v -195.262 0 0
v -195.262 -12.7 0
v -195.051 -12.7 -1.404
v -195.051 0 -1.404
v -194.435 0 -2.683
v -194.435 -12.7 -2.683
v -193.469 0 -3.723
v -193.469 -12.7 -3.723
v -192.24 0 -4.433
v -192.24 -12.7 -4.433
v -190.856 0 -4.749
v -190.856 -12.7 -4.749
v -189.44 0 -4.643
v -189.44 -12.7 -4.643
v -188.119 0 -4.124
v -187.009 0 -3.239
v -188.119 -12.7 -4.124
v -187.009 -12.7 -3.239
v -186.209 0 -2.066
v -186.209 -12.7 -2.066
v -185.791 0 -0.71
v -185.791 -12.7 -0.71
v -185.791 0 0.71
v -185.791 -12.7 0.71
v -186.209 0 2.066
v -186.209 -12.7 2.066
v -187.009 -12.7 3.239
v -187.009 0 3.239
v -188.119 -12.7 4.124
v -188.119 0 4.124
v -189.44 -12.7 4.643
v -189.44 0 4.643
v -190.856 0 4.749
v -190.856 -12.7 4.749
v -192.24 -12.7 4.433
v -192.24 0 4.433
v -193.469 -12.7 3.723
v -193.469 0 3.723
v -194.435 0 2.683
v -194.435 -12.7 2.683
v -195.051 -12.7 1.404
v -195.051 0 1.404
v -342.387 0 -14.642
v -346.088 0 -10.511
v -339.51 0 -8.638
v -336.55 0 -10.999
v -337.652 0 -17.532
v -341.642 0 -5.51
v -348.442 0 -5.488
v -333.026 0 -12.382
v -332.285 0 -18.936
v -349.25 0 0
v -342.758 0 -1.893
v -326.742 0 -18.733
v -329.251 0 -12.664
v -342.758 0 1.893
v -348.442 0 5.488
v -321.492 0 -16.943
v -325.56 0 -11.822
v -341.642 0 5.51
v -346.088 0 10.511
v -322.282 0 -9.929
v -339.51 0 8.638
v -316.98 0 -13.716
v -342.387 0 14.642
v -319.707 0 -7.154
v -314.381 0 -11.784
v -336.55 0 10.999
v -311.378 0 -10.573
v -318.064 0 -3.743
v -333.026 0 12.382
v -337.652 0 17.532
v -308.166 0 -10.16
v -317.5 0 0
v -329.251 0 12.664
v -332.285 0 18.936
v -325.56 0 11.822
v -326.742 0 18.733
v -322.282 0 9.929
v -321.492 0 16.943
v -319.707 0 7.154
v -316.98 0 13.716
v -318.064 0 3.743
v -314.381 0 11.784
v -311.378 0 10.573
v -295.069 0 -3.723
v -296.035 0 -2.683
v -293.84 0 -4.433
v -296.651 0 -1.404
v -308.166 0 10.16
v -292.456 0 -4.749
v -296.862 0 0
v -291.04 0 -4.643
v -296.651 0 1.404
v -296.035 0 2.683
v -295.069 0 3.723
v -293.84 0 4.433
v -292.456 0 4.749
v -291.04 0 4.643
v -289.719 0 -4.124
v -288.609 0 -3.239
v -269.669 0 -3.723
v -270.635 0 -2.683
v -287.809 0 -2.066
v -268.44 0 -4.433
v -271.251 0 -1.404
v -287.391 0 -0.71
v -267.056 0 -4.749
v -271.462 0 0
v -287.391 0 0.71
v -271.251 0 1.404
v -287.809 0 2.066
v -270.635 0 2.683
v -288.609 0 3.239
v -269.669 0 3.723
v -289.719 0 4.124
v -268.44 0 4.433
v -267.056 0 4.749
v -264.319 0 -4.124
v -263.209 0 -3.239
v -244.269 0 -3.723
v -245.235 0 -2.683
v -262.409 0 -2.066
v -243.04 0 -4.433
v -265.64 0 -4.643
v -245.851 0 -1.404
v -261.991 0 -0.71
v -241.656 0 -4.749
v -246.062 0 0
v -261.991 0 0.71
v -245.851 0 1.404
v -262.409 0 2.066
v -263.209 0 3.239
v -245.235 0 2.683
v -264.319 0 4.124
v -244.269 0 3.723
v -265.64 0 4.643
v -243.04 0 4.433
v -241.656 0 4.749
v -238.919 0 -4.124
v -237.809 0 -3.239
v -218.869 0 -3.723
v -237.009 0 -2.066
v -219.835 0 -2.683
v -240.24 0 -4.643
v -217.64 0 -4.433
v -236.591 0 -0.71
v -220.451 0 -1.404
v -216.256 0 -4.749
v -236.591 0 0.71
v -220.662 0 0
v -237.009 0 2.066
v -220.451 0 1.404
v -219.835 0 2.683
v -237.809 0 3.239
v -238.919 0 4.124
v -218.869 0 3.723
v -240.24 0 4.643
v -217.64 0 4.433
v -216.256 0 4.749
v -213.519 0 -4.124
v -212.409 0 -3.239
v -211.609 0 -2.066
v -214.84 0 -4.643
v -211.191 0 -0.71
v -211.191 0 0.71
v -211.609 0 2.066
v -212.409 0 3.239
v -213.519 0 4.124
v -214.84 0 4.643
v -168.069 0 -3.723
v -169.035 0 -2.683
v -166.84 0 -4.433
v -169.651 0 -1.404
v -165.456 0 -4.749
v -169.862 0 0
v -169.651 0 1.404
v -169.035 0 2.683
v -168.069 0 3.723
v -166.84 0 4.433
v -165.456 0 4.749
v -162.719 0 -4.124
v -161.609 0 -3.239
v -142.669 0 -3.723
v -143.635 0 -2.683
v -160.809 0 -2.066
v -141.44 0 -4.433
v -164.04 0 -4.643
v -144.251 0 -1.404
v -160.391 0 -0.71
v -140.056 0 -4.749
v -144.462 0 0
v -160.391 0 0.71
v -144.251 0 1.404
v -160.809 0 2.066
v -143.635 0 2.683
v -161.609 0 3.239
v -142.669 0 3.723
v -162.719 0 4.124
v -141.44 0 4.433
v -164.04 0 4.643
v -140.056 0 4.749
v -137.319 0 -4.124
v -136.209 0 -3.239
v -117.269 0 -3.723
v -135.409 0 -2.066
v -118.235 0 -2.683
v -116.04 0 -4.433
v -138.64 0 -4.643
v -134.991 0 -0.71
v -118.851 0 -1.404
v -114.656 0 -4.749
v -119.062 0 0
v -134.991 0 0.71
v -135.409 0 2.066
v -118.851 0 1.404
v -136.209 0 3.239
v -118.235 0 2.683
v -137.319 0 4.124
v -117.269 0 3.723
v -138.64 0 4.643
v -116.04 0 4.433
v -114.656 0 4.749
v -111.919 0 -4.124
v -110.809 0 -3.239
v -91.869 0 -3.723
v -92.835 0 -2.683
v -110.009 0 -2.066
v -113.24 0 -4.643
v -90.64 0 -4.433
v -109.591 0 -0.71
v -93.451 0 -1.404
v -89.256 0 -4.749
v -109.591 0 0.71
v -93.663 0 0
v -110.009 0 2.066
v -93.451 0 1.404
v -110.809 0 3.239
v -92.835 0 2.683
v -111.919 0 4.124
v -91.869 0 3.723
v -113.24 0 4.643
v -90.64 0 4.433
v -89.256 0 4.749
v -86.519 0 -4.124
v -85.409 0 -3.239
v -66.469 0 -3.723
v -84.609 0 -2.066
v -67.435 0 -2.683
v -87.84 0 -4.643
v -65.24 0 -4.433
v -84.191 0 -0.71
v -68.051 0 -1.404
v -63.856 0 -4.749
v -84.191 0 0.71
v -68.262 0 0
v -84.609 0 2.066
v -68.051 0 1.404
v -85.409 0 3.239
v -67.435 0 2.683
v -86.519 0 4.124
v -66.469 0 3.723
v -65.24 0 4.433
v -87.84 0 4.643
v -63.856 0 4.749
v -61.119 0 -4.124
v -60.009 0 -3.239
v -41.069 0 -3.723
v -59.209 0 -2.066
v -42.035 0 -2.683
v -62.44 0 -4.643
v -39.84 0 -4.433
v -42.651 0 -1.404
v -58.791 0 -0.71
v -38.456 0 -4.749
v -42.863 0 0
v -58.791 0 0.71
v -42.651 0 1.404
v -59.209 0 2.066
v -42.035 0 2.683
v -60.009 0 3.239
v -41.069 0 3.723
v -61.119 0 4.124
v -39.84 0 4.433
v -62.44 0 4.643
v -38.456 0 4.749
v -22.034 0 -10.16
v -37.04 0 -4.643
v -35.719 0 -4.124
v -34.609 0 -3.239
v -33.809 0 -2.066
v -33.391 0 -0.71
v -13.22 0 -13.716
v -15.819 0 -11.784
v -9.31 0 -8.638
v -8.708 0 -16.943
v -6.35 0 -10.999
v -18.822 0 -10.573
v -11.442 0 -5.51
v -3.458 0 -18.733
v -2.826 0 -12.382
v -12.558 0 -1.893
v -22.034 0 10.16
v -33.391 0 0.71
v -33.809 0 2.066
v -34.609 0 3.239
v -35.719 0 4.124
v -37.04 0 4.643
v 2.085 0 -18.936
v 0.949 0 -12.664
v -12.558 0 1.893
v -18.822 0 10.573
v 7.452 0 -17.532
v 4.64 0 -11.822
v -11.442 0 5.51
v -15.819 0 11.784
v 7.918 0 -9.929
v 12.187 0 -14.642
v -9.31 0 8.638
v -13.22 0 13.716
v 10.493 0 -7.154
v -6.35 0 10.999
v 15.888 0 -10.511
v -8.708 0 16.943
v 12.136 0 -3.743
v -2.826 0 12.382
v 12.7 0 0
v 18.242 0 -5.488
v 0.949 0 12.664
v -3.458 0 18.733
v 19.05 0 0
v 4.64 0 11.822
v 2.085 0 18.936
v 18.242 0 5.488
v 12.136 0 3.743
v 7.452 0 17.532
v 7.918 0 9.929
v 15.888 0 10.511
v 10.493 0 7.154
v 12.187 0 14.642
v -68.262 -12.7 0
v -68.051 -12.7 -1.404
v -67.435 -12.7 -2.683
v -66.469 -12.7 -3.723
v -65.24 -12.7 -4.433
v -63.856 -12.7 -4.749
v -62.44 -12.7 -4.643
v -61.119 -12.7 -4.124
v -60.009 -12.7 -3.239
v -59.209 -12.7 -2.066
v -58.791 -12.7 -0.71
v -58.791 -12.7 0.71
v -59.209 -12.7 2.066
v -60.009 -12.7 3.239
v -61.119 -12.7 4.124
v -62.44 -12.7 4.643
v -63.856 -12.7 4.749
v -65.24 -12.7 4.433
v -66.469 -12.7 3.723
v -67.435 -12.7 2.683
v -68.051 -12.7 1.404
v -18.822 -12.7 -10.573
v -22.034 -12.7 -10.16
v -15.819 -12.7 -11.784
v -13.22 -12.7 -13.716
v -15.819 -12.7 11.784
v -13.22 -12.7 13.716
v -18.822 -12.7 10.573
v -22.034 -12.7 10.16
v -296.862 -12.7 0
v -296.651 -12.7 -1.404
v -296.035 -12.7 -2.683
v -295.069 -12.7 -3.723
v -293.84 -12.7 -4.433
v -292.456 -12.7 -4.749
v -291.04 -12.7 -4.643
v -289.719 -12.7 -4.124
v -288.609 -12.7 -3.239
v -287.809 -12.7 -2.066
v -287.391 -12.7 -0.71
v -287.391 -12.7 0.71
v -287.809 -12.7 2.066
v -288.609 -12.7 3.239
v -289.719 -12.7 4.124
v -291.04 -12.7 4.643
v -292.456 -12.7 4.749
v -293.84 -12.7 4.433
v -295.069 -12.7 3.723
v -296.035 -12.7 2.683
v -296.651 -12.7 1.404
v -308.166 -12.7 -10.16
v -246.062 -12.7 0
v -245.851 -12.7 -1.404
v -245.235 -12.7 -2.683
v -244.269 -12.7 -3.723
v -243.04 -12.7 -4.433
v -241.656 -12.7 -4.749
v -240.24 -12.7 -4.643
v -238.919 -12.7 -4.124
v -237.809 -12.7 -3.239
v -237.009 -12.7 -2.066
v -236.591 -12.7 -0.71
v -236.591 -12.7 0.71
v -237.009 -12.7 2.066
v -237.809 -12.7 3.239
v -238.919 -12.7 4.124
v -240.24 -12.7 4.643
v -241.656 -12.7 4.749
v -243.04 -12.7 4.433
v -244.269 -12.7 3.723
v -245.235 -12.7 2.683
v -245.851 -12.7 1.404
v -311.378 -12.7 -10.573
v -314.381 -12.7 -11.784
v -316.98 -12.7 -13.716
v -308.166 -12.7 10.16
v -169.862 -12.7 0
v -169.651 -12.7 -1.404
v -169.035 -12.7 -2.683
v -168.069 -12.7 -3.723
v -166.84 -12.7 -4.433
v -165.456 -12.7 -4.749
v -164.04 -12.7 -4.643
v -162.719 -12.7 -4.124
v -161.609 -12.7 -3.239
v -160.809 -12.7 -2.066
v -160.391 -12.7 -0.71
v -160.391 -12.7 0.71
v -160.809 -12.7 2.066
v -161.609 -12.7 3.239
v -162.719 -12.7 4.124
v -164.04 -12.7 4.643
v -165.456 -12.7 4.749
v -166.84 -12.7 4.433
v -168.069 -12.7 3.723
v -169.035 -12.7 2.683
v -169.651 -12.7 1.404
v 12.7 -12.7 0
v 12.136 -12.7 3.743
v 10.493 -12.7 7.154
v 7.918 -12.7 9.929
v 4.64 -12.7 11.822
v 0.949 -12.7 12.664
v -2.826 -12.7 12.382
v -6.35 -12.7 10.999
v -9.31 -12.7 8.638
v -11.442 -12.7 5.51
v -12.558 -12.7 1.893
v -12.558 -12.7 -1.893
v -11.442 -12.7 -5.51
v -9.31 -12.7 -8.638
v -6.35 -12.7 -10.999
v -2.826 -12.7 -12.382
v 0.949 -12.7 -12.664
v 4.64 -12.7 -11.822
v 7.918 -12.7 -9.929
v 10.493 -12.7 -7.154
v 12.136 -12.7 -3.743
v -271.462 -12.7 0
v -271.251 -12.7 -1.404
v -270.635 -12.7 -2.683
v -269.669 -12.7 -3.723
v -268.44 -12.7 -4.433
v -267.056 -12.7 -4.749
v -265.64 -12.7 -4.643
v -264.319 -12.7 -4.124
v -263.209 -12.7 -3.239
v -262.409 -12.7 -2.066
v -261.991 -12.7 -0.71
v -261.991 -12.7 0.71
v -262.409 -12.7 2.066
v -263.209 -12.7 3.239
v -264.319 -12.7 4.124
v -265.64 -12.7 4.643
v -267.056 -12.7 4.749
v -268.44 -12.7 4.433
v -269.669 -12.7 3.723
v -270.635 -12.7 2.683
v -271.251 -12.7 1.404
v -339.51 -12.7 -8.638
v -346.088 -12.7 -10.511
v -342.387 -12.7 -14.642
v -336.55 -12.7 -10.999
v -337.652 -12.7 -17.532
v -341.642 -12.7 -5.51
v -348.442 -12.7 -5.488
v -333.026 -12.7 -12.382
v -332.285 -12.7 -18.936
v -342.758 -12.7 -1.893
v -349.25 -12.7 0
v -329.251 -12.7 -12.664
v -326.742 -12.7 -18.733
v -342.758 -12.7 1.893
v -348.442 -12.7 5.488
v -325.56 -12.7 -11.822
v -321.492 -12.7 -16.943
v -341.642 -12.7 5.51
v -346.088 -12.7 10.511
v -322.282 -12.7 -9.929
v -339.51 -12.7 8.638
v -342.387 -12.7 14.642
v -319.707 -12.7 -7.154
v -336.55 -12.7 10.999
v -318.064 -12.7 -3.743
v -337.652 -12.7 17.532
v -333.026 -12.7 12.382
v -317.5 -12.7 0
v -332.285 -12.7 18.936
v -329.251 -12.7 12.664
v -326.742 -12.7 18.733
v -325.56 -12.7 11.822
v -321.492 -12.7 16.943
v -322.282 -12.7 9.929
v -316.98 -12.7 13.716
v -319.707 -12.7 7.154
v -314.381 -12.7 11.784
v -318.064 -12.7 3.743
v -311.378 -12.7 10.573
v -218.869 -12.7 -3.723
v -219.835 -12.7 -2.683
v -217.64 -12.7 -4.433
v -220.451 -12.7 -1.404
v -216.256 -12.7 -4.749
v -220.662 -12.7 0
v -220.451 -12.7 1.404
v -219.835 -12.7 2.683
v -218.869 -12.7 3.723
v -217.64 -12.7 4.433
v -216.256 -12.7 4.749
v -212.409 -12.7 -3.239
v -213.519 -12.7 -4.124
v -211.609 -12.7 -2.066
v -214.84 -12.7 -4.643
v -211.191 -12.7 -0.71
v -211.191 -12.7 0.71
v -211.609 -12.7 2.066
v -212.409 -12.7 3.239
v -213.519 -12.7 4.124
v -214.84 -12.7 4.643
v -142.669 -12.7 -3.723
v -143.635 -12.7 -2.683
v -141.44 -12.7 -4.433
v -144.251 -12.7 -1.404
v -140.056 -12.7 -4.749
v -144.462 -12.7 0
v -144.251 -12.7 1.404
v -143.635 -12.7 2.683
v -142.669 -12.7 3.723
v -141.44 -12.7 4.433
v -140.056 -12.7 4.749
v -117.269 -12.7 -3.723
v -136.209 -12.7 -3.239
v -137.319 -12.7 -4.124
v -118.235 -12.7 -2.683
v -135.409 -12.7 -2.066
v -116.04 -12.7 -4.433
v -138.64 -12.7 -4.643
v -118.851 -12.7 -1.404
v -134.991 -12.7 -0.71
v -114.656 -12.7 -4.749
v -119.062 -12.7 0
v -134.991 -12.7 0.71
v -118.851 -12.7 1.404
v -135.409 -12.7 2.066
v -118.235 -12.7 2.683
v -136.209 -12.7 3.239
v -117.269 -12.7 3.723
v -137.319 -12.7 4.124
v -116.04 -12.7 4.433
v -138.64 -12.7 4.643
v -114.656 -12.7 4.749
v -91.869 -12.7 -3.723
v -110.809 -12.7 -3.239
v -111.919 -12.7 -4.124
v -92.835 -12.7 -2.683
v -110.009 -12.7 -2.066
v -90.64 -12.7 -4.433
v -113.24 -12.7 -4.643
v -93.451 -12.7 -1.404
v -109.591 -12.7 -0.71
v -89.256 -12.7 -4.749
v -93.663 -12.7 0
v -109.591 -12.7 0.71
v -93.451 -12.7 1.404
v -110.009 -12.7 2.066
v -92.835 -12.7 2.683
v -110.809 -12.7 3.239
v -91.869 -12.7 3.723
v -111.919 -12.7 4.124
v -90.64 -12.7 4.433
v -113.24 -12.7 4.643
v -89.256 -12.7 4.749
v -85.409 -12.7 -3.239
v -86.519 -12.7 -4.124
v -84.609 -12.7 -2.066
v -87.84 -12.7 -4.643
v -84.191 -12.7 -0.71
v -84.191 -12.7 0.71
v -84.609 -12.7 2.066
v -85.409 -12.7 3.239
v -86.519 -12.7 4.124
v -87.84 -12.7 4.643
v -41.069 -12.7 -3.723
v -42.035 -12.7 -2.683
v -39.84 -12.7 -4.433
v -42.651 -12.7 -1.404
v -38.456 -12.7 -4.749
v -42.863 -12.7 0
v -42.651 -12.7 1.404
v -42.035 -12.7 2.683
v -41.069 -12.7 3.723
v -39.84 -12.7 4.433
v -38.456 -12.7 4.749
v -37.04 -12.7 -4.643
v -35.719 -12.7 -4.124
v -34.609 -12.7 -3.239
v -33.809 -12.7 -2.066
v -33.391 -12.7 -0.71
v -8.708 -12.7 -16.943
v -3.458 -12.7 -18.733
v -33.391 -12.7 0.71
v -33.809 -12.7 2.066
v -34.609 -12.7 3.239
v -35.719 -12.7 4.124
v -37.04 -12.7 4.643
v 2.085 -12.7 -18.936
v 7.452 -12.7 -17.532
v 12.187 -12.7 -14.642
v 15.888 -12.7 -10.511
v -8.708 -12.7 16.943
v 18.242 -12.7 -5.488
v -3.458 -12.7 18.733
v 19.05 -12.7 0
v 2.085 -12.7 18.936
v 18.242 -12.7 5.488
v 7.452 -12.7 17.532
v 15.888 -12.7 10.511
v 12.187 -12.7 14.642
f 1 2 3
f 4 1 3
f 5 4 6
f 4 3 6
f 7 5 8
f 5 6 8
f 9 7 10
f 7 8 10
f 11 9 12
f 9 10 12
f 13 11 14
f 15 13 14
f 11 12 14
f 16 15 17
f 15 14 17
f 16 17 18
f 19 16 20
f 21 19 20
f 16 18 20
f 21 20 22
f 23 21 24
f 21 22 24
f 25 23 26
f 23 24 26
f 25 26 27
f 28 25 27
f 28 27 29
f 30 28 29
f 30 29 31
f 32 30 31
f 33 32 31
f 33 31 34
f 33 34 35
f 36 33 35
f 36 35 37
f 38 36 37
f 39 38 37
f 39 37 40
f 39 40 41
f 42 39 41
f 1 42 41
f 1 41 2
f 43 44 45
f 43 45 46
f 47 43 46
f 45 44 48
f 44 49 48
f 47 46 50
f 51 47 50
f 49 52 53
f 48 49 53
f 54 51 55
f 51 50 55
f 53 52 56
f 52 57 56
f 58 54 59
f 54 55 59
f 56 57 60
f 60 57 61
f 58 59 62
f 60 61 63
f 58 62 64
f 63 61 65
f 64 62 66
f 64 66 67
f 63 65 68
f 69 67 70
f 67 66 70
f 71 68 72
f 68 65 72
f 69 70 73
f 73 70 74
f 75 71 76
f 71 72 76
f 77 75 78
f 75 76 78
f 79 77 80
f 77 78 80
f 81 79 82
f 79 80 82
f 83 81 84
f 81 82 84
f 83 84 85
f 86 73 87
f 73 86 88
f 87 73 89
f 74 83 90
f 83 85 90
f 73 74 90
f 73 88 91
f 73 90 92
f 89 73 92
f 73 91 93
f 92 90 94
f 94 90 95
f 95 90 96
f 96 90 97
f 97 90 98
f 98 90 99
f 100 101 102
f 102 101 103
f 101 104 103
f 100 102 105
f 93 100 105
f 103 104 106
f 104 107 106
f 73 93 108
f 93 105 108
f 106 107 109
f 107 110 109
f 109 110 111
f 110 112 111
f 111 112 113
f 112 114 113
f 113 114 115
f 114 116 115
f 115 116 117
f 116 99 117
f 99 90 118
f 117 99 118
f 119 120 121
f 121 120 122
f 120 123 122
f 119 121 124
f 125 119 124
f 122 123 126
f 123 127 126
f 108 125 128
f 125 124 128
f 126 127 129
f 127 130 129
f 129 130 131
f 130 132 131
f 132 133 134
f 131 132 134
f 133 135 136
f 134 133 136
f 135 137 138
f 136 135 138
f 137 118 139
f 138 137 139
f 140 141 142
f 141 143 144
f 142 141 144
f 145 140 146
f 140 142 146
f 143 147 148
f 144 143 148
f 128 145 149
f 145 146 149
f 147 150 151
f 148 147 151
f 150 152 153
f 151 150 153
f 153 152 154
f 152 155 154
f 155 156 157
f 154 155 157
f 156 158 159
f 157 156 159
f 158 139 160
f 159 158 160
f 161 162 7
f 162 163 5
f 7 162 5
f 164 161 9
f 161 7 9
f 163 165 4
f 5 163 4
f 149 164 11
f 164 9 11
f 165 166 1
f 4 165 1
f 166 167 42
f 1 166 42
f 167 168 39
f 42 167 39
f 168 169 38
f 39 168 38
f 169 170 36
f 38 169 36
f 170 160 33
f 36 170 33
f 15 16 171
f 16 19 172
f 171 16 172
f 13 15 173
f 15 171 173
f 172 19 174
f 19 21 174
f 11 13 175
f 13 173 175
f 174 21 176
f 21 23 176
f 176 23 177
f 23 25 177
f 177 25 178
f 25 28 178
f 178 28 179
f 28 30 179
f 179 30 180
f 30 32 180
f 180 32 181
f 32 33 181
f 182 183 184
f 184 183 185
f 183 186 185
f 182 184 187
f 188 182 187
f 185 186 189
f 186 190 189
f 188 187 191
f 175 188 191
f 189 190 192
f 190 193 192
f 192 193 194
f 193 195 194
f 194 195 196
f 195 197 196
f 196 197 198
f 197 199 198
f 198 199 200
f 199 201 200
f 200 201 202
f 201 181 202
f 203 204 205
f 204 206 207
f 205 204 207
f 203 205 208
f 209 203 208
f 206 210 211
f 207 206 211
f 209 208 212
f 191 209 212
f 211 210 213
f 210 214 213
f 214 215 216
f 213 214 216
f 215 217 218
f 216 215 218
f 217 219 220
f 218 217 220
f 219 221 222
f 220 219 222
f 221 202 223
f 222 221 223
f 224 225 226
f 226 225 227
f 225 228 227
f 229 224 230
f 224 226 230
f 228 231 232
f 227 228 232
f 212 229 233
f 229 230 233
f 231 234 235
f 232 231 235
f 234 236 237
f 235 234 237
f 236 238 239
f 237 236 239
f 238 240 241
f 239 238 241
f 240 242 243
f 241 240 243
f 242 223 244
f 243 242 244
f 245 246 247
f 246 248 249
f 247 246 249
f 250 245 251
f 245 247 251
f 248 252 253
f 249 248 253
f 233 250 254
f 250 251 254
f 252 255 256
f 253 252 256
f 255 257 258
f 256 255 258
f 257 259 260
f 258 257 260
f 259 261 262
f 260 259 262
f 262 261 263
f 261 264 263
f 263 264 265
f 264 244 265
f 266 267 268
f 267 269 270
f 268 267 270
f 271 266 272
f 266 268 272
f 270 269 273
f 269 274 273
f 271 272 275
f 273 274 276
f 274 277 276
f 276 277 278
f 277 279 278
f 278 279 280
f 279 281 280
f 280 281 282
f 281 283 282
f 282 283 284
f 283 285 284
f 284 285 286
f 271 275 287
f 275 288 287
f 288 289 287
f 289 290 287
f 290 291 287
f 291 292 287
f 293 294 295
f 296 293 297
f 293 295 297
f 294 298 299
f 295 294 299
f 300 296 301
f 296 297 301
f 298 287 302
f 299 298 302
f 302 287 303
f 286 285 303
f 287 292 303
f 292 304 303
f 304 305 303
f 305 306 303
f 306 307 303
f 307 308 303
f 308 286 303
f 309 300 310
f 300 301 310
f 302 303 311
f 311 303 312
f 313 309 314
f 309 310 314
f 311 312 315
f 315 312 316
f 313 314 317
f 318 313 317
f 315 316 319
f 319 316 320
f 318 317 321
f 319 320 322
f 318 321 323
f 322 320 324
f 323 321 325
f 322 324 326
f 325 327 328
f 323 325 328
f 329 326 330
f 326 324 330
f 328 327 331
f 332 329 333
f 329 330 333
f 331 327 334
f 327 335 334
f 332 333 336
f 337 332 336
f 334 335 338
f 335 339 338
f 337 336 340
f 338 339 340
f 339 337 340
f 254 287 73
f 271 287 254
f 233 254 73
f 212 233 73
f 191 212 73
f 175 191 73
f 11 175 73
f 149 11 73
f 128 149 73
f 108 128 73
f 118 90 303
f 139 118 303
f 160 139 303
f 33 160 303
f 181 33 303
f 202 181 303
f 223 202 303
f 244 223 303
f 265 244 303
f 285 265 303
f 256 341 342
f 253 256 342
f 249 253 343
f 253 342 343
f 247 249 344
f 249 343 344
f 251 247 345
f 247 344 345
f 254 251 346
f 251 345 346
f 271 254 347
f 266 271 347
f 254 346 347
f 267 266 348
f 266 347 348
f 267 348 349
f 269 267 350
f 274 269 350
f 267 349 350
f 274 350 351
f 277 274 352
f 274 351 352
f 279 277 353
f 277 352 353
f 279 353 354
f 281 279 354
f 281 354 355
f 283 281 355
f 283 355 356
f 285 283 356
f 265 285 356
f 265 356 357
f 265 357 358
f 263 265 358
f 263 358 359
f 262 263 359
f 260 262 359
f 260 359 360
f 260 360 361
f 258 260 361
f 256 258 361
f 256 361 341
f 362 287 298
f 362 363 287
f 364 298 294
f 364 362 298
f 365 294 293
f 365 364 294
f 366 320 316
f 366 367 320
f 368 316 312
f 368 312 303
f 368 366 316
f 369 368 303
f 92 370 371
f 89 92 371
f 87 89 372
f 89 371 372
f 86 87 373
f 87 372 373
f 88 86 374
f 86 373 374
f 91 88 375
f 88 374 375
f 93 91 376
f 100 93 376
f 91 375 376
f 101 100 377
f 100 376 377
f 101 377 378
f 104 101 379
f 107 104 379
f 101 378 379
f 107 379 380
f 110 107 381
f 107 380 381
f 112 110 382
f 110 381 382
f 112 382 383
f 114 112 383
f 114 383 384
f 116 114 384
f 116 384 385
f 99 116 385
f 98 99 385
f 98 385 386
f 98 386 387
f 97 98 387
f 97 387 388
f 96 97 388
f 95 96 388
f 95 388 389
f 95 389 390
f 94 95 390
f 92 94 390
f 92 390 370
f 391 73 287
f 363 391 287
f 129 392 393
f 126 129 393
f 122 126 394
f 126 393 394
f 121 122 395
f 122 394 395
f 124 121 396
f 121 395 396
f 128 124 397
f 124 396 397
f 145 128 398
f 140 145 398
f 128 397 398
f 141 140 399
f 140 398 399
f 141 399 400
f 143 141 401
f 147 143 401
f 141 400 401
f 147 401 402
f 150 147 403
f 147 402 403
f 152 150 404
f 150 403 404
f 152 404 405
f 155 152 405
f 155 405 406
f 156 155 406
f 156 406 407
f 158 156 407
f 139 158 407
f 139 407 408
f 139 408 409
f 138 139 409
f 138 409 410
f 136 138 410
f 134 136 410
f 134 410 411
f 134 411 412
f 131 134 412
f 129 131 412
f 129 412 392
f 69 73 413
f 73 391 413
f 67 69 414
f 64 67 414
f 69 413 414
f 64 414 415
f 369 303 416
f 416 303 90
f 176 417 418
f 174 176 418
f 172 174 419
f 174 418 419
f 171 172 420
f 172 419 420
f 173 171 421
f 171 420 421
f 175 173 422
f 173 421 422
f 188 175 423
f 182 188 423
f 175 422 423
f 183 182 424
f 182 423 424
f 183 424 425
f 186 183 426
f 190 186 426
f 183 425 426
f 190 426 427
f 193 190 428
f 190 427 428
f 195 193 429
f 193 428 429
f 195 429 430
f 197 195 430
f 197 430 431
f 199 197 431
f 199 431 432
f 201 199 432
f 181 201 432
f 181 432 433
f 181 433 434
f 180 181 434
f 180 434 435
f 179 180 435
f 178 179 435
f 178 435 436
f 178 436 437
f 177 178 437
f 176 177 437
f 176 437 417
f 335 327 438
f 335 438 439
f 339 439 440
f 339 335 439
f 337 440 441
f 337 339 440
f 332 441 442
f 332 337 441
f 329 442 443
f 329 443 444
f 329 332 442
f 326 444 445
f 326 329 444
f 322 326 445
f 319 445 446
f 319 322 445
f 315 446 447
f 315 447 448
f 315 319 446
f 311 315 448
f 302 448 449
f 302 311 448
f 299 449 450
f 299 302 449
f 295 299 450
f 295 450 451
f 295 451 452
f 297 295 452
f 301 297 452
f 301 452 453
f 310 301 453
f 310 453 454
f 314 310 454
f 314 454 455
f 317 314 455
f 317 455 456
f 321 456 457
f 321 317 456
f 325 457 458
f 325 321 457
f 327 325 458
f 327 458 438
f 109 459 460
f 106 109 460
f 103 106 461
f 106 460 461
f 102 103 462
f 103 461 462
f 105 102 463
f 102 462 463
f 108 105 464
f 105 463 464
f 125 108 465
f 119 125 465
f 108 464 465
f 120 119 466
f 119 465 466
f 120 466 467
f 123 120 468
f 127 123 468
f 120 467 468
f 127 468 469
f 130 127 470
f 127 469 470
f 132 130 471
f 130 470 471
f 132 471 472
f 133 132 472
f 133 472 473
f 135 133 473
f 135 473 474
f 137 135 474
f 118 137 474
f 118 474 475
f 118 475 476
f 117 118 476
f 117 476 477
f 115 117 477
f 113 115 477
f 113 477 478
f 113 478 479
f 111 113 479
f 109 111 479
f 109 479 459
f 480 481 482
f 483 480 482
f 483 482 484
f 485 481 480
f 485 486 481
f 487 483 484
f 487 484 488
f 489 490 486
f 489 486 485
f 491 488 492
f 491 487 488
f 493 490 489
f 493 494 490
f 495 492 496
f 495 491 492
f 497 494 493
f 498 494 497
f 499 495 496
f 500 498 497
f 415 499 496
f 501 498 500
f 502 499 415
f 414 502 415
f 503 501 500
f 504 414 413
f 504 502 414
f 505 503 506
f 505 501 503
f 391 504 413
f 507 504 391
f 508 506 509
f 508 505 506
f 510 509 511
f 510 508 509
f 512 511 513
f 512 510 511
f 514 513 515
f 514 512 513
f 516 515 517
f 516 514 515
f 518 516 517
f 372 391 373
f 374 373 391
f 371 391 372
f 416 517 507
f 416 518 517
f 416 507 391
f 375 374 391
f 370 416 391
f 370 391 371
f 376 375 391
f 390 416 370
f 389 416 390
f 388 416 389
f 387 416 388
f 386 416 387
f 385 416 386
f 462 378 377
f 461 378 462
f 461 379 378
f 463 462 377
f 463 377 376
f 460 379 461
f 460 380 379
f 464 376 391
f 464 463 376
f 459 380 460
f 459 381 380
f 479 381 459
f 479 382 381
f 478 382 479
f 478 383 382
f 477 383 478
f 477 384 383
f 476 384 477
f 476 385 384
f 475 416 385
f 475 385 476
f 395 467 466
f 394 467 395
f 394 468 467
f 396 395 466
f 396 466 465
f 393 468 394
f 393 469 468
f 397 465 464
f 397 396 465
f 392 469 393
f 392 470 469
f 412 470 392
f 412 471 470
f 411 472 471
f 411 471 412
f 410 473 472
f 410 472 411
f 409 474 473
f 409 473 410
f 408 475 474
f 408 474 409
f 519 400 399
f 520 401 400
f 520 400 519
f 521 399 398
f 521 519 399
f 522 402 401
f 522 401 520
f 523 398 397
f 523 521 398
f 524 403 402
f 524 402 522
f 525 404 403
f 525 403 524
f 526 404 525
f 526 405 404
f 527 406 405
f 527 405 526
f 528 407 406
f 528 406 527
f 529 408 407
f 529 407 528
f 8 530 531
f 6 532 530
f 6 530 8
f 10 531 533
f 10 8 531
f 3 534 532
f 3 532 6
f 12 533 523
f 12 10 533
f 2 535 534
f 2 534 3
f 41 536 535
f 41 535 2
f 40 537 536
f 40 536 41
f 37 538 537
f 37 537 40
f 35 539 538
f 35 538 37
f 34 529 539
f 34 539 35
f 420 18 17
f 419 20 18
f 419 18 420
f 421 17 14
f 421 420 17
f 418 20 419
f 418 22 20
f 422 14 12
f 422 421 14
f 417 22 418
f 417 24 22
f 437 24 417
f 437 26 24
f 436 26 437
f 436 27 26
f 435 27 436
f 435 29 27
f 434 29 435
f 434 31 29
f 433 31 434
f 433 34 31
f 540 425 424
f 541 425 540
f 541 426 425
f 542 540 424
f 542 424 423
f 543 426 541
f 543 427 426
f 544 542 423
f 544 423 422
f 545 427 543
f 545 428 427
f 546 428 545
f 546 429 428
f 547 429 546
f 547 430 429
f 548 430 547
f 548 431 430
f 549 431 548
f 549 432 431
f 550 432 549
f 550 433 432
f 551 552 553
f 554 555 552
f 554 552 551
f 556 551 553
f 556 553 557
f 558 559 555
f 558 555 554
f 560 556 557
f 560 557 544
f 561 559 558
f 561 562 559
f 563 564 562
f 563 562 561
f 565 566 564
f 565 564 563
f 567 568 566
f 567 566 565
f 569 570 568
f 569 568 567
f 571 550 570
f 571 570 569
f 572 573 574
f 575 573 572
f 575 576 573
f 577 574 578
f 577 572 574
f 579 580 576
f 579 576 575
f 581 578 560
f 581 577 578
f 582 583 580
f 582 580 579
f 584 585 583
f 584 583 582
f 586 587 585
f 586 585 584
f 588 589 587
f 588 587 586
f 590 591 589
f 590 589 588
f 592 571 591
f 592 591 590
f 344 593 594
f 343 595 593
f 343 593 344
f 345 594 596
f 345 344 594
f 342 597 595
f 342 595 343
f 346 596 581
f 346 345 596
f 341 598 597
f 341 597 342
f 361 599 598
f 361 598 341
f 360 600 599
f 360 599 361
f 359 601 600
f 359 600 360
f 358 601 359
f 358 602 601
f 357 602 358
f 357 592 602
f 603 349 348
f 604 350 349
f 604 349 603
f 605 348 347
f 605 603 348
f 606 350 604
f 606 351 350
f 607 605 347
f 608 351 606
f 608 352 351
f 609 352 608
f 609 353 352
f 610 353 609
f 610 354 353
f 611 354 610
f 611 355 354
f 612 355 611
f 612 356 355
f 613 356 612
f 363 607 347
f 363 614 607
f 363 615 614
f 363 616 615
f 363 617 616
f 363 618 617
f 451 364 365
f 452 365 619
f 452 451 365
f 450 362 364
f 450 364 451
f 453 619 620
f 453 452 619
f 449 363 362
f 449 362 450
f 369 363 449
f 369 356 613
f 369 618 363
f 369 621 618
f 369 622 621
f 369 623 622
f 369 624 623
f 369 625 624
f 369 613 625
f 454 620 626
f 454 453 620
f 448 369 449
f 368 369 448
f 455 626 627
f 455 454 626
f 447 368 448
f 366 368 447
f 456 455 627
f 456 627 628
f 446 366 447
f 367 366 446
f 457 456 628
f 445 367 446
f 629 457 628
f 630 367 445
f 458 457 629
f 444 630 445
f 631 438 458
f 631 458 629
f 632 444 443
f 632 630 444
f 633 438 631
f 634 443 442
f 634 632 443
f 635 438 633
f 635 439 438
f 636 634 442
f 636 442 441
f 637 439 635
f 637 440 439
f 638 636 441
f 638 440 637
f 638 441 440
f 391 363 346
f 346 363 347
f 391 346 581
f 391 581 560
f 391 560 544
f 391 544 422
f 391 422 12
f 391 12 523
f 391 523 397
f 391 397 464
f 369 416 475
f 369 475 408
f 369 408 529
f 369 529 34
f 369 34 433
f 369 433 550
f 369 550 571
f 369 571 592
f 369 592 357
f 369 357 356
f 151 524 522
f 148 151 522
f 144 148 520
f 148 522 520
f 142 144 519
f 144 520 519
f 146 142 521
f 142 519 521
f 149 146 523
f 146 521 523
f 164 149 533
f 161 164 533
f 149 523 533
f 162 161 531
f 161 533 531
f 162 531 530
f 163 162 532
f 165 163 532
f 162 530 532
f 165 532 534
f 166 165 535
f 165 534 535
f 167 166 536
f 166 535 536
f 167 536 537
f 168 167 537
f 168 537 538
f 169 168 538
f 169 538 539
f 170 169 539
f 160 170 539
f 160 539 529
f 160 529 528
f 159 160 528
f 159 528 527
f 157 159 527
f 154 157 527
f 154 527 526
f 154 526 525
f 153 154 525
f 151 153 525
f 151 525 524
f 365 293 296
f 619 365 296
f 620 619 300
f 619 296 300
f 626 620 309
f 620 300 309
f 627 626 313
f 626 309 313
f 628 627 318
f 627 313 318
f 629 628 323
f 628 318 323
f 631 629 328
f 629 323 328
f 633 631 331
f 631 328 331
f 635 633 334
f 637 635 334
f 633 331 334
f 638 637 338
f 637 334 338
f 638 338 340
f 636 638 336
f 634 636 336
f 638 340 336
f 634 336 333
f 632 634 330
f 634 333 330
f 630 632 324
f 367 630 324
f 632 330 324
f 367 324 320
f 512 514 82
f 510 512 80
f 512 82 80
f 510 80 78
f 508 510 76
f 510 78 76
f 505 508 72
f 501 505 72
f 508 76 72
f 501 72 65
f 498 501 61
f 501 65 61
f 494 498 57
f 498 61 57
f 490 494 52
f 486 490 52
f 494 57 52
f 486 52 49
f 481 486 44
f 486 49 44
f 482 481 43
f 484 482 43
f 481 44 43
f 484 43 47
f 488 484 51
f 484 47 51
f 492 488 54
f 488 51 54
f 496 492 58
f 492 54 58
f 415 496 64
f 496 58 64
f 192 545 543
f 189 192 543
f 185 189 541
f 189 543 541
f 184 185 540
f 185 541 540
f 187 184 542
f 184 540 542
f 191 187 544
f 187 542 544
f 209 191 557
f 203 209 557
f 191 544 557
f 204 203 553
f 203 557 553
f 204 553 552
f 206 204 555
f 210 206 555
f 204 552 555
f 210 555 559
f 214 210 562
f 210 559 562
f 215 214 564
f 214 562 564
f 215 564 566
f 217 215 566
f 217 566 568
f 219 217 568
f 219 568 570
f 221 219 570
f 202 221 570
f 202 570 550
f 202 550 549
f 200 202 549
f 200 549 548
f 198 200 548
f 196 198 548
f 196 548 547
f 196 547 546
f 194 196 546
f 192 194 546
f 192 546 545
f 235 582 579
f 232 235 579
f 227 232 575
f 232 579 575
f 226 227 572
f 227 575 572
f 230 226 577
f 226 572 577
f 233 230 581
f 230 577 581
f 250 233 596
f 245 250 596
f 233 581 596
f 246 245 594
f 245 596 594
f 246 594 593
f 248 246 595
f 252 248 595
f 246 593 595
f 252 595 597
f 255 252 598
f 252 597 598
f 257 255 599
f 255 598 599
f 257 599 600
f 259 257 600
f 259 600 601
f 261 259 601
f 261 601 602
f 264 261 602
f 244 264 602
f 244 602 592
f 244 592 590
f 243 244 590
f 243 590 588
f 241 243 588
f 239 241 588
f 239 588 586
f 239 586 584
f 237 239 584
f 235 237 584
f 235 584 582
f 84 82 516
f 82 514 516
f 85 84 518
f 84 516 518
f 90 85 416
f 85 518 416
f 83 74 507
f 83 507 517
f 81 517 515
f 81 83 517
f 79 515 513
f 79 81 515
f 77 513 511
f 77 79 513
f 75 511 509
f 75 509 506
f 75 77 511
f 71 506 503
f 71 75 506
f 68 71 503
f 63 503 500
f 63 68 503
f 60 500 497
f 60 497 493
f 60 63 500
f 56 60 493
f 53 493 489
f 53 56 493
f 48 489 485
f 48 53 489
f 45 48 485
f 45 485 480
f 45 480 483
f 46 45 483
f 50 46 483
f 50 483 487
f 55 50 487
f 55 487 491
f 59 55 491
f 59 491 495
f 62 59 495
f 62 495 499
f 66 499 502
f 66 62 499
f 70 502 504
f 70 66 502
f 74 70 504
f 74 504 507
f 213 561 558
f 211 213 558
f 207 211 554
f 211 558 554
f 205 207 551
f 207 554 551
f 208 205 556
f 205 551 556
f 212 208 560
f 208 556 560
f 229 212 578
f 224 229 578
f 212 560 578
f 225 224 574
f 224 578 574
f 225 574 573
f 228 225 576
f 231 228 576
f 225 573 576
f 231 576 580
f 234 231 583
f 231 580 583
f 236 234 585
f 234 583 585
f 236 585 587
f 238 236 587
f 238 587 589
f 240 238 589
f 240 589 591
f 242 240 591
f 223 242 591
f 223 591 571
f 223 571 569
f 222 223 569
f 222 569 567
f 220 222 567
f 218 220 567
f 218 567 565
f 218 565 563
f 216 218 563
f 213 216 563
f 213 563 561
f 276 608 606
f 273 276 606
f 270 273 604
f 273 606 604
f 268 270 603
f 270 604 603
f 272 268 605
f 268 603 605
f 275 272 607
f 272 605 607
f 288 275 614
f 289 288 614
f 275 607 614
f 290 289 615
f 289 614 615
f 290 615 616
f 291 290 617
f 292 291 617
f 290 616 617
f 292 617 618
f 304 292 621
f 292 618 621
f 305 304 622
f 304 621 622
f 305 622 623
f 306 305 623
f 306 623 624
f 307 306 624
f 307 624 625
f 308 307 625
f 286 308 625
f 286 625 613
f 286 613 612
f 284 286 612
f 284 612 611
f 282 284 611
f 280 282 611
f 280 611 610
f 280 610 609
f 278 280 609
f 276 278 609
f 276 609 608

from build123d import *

# Parameters (mm, degrees)
F0_R     = 12.7
F1_DEPTH = 12.7
F2_D     = 9.525
F3_R     = 12.7


with BuildPart() as f1:
    # F0 (on Front) → F1 (new body)
    with BuildSketch(Plane.XZ):
        with BuildLine():
            Line((-314.085507, -10.16), (-16.114493, -10.16))
            ThreePointArc((-16.114493, -10.16), (19.05, 0), (-16.114493, 10.16))
            Line((-16.114493, 10.16), (-314.085507, 10.16))
            ThreePointArc((-314.085507, 10.16), (-349.25, 0), (-314.085507, -10.16))
        make_face()
        with Locations((-330.2, 0)):
            Circle(F0_R, mode=Mode.SUBTRACT)
        Circle(F0_R, mode=Mode.SUBTRACT)
    extrude(amount=F1_DEPTH)

    # F2 (through all)
    with Locations(Plane(origin=(0, 0, 0), x_dir=(1, 0, 0), z_dir=(0, 1, 0))):
        with Locations((-292.1, 0), (-266.7, 0), (-241.3, 0), (-215.9, 0), (-190.5, 0), (-165.1, 0), (-139.7, 0), (-114.3, 0), (-88.9, 0), (-63.5, 0), (-38.1, 0)):
            Hole(F2_D / 2)

    # F3
    f3_edges = [f1.edges().sort_by_distance(p)[0] for p in [
        (-314.085507, -6.35, -10.16),
        (-16.114493, -6.35, -10.16),
        (-16.114493, -6.35, 10.16),
        (-314.085507, -6.35, 10.16),
    ]]
    fillet(f3_edges, radius=F3_R)


solid = f1.part
